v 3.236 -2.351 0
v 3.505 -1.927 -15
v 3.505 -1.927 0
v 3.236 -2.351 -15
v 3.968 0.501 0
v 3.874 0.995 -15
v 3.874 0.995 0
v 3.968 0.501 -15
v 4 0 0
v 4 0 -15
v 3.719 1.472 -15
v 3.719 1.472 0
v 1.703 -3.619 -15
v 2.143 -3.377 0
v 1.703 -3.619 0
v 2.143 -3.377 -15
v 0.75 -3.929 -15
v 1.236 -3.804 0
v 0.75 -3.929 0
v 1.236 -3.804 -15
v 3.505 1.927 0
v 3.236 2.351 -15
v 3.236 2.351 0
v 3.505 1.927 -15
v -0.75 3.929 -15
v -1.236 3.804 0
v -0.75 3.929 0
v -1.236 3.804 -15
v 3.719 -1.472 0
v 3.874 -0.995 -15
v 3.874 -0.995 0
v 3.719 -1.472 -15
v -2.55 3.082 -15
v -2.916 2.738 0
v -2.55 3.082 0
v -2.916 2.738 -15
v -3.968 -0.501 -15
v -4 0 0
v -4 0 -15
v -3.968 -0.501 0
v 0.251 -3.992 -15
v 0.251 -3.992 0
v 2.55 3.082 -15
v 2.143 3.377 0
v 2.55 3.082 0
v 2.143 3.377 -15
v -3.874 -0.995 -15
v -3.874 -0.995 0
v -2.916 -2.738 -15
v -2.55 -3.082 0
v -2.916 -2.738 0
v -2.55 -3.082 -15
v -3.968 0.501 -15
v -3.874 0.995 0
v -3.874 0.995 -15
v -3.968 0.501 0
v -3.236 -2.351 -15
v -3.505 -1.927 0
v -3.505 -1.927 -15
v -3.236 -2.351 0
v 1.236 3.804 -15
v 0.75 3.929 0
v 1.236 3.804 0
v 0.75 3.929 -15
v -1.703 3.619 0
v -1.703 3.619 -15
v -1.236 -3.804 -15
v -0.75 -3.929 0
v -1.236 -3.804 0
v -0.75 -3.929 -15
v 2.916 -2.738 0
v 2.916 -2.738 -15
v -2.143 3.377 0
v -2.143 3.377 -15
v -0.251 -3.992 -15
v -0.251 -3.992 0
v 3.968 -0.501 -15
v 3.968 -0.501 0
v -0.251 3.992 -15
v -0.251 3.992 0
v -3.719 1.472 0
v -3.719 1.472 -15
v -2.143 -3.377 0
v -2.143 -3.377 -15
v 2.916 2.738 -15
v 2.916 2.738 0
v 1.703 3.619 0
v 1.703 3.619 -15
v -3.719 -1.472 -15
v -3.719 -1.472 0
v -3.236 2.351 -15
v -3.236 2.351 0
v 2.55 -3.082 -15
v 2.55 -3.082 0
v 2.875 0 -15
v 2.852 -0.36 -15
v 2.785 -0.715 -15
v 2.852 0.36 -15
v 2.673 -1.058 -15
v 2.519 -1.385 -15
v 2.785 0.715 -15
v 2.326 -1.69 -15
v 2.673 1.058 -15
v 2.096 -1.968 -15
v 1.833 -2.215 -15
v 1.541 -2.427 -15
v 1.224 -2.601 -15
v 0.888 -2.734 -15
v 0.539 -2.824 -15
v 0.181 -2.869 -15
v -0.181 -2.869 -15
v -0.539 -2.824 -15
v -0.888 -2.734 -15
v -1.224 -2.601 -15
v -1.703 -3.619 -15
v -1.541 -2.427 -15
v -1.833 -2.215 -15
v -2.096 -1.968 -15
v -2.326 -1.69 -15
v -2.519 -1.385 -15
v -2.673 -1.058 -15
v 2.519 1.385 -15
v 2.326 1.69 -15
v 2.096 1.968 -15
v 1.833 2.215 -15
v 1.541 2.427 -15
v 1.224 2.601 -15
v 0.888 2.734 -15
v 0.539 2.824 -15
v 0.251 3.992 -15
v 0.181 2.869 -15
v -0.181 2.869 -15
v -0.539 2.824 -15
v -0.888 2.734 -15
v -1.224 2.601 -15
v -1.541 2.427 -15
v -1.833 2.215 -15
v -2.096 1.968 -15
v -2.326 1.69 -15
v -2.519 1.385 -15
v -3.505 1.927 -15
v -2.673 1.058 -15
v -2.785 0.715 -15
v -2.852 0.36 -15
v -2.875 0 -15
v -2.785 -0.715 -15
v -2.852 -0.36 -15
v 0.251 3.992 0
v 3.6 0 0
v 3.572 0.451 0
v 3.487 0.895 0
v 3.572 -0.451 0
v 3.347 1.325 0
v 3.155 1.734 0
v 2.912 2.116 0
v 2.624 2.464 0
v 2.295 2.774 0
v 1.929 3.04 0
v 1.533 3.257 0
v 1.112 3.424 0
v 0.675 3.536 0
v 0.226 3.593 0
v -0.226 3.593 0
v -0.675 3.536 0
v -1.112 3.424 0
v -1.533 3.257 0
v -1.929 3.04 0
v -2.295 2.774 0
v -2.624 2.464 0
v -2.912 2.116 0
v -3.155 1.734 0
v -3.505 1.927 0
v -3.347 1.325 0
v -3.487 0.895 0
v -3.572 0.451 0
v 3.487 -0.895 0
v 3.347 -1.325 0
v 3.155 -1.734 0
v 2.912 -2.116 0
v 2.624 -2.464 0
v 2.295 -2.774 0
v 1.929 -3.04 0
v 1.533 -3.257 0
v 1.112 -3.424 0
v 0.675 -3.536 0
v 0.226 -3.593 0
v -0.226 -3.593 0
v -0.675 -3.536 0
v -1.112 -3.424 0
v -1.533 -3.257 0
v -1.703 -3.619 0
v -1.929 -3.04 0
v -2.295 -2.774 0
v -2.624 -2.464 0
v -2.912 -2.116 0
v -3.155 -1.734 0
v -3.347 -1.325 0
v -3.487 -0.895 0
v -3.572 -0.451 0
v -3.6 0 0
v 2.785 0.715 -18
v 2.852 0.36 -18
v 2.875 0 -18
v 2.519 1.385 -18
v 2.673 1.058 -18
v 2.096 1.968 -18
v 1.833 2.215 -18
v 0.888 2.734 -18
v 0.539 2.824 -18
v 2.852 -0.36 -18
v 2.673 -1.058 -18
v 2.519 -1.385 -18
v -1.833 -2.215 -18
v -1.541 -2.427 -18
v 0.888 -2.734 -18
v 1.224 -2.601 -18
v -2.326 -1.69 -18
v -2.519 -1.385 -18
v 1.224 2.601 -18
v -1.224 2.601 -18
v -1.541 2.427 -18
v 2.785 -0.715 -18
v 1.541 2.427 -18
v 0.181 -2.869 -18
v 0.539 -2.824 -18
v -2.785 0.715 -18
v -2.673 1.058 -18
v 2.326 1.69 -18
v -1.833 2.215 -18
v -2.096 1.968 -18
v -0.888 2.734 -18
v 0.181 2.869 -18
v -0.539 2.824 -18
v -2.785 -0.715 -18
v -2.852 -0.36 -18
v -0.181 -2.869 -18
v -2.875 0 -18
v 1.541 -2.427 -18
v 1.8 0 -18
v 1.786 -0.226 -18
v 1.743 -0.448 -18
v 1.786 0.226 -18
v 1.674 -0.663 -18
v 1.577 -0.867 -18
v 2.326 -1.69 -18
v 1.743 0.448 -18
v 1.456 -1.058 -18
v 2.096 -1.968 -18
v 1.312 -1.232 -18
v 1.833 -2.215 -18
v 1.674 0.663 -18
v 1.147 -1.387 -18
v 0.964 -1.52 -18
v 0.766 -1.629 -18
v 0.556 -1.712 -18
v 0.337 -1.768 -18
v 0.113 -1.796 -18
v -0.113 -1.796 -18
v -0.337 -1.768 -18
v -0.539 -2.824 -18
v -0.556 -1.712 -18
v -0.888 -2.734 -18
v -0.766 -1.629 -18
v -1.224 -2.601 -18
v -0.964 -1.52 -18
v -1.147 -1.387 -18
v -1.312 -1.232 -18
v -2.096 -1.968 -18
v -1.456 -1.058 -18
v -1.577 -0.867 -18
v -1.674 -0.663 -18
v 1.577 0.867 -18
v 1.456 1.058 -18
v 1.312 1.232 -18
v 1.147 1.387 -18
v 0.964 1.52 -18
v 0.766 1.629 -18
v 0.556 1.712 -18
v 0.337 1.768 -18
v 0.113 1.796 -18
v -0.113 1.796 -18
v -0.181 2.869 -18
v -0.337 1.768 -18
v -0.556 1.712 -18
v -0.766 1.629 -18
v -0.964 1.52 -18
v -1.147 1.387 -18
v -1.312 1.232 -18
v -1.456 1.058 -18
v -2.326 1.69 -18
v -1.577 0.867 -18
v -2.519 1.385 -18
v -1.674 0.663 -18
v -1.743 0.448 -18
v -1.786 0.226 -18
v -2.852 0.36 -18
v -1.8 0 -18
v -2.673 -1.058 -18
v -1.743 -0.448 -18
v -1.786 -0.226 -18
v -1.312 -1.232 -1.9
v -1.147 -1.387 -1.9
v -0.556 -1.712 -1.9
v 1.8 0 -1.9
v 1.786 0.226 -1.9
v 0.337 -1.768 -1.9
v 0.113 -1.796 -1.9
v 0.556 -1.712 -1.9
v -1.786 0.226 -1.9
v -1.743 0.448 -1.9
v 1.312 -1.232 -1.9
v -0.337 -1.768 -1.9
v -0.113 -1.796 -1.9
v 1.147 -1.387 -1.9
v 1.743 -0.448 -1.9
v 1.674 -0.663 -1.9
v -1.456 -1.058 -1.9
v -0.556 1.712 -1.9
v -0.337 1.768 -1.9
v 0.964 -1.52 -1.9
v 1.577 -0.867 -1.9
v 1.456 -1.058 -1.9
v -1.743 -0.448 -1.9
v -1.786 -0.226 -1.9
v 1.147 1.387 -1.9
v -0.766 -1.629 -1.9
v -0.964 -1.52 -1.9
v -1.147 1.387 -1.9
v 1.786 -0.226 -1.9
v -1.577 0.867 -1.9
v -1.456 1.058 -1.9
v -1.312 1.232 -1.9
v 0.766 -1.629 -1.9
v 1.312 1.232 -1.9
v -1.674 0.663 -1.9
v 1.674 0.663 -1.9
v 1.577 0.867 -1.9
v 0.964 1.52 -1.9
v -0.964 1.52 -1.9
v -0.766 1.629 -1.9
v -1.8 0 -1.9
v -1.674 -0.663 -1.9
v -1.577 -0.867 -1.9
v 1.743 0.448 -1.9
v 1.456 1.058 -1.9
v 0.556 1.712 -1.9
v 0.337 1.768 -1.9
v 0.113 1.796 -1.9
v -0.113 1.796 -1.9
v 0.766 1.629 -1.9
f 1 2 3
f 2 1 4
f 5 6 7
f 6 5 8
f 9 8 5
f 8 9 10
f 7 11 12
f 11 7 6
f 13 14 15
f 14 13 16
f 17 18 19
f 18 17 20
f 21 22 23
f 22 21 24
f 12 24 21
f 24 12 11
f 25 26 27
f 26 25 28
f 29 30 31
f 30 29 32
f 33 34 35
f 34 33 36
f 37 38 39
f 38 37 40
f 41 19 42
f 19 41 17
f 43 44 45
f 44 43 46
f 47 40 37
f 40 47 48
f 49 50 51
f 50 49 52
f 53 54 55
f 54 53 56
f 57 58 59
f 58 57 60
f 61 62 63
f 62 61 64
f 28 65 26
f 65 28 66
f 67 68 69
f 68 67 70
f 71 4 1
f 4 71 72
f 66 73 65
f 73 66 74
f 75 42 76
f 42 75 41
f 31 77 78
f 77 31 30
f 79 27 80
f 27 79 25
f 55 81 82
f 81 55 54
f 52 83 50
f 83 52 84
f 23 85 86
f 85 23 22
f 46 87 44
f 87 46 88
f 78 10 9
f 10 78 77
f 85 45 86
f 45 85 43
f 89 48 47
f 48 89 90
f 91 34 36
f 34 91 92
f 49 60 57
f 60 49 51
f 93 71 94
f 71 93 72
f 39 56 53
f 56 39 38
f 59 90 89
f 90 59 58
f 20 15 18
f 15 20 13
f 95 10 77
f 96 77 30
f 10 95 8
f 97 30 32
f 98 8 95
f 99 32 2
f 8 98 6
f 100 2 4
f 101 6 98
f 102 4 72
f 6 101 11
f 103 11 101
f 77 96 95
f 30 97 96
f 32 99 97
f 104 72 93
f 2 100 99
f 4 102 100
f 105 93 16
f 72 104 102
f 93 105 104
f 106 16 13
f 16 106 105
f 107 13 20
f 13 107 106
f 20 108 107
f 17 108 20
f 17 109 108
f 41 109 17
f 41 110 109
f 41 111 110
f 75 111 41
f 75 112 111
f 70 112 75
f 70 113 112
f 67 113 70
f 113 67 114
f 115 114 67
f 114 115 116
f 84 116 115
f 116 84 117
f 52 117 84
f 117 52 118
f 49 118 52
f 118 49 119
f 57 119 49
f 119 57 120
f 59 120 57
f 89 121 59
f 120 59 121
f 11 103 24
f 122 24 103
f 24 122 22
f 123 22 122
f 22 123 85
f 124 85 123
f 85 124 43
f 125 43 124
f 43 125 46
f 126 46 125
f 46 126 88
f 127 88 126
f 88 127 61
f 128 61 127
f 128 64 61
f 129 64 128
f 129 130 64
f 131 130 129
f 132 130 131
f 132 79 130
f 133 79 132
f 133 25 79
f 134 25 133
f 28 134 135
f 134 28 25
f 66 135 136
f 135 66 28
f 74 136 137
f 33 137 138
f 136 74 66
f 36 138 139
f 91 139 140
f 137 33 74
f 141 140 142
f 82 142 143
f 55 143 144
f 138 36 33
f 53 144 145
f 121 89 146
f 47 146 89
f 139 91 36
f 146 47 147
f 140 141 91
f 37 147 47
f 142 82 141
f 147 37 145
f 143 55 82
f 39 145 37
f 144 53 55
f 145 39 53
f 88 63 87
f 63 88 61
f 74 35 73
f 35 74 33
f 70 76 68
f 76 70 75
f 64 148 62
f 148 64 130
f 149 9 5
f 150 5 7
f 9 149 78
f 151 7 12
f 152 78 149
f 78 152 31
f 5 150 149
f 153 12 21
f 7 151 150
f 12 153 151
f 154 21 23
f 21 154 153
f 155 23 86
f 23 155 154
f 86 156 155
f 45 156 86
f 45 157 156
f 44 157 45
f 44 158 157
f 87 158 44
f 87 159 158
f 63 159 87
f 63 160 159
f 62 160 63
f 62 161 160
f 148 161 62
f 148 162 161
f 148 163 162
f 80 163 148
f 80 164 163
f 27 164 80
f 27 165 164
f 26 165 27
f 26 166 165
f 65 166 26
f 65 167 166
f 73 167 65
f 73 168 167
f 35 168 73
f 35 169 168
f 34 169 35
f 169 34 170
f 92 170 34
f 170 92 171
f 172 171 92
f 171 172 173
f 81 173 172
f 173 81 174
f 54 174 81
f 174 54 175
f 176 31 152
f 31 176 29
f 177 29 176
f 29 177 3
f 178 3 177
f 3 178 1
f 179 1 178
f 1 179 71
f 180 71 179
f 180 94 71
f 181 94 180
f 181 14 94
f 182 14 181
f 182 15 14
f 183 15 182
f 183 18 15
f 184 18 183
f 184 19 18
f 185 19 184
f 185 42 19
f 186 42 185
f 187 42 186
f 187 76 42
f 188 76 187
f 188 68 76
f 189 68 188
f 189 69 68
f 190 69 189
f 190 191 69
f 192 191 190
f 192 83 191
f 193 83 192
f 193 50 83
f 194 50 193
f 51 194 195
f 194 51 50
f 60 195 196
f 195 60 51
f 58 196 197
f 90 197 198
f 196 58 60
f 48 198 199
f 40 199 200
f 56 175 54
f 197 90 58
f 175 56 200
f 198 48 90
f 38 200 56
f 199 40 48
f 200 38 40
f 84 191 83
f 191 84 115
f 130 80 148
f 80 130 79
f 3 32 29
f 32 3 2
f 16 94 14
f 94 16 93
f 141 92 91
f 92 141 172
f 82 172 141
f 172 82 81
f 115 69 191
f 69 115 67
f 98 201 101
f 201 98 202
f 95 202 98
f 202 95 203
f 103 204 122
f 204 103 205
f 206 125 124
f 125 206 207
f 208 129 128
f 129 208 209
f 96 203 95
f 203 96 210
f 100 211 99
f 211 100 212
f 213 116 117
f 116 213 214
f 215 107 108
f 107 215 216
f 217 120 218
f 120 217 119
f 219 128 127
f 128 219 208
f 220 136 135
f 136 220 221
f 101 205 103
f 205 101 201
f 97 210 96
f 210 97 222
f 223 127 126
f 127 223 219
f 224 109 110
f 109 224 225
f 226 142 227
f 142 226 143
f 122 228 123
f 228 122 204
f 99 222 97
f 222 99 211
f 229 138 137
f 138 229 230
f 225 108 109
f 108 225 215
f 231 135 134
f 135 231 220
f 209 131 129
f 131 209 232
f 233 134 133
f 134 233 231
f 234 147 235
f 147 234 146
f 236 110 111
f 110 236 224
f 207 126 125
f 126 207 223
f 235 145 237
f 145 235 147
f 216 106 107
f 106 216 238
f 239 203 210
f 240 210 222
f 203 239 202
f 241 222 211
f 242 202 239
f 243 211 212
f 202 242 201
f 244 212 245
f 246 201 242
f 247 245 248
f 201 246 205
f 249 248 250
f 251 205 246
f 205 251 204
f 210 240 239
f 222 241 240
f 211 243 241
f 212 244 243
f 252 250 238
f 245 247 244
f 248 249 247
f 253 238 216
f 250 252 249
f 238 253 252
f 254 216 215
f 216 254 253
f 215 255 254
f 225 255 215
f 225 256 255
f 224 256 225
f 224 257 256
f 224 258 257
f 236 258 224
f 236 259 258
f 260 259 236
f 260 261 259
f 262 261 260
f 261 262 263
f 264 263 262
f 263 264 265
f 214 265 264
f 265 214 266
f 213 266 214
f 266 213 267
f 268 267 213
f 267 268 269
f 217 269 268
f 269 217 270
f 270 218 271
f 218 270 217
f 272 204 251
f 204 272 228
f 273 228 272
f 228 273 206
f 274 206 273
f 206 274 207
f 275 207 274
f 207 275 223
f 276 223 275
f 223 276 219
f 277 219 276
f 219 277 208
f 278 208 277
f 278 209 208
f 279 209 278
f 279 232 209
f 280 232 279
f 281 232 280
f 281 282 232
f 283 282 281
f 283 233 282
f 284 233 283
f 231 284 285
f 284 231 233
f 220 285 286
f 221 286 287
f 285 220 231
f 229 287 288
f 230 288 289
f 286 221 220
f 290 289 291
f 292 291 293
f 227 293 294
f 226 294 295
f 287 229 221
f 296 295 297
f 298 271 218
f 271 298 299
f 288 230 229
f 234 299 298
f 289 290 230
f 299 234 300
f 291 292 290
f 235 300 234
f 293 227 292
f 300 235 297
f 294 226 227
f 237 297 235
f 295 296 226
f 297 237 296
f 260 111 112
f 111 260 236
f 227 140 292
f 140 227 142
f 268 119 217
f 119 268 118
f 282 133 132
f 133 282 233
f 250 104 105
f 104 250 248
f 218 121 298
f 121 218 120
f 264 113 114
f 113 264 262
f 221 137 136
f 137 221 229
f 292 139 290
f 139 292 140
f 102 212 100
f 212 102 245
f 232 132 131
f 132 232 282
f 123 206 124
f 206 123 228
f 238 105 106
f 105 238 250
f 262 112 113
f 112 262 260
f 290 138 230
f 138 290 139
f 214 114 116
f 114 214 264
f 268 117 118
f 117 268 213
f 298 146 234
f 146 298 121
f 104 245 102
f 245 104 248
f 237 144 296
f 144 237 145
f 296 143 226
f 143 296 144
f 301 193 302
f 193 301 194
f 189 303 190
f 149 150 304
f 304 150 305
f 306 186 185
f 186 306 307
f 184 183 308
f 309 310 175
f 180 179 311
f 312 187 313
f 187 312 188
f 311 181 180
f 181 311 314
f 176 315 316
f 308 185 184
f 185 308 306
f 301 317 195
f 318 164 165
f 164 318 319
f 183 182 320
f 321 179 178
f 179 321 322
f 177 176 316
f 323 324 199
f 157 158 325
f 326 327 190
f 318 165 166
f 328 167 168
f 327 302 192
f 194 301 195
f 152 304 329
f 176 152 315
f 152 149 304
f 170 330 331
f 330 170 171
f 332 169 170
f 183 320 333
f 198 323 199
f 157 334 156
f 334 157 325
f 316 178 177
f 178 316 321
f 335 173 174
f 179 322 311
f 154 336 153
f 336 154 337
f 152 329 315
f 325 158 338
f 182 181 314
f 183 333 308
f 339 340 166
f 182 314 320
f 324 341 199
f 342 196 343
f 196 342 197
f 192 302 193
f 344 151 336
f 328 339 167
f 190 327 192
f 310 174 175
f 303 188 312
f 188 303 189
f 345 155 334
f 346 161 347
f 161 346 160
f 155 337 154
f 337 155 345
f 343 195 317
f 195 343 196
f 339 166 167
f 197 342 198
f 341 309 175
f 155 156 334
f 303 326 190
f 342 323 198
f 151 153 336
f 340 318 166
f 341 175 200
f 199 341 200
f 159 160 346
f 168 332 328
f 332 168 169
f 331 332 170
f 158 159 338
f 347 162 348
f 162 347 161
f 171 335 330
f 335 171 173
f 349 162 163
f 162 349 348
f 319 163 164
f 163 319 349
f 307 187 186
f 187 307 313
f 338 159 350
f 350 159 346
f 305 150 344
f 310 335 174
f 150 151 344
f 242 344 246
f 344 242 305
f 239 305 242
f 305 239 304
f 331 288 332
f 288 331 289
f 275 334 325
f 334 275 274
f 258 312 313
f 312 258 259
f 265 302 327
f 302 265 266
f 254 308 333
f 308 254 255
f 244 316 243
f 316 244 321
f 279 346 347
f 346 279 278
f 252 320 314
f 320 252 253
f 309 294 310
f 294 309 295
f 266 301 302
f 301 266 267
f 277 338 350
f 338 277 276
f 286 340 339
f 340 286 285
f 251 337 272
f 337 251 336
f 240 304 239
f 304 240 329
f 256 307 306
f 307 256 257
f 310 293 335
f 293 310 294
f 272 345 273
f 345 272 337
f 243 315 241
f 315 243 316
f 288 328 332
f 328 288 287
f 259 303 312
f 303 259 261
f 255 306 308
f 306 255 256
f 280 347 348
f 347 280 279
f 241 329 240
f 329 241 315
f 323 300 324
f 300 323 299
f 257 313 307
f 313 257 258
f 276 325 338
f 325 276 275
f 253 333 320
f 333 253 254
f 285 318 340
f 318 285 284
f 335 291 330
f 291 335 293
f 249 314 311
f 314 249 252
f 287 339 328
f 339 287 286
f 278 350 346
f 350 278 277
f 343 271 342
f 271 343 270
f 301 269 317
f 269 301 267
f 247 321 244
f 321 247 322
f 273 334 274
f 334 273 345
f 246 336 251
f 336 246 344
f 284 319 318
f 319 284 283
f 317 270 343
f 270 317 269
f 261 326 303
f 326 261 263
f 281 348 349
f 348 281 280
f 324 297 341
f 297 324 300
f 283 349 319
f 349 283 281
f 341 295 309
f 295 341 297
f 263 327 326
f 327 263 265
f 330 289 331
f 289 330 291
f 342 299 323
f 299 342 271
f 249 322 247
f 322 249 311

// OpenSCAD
$fn = 50;

difference() {
	union() {
		translate(v = [0, 0, -15.0]) {
			cylinder(h = 15, r = 4.0);
		}
		#translate(v = [0, 0, -18.0]) {
			cylinder(h = 18, r = 2.875);
		}
	}
	union() {
		translate(v = [0, 0, 0]) {
			rotate(a = [0, 0, 0]) {
				difference() {
					union() {
						translate(v = [0, 0, -18.0]) {
							cylinder(h = 18, r = 1.5);
						}
						translate(v = [0, 0, -1.9]) {
							cylinder(h = 1.9, r1 = 1.8, r2 = 3.6);
						}
						translate(v = [0, 0, -18.0]) {
							cylinder(h = 18, r = 1.8);
						}
						translate(v = [0, 0, -18.0]) {
							cylinder(h = 18, r = 1.5);
						}
					}
					union();
				}
			}
		}
	}
}
